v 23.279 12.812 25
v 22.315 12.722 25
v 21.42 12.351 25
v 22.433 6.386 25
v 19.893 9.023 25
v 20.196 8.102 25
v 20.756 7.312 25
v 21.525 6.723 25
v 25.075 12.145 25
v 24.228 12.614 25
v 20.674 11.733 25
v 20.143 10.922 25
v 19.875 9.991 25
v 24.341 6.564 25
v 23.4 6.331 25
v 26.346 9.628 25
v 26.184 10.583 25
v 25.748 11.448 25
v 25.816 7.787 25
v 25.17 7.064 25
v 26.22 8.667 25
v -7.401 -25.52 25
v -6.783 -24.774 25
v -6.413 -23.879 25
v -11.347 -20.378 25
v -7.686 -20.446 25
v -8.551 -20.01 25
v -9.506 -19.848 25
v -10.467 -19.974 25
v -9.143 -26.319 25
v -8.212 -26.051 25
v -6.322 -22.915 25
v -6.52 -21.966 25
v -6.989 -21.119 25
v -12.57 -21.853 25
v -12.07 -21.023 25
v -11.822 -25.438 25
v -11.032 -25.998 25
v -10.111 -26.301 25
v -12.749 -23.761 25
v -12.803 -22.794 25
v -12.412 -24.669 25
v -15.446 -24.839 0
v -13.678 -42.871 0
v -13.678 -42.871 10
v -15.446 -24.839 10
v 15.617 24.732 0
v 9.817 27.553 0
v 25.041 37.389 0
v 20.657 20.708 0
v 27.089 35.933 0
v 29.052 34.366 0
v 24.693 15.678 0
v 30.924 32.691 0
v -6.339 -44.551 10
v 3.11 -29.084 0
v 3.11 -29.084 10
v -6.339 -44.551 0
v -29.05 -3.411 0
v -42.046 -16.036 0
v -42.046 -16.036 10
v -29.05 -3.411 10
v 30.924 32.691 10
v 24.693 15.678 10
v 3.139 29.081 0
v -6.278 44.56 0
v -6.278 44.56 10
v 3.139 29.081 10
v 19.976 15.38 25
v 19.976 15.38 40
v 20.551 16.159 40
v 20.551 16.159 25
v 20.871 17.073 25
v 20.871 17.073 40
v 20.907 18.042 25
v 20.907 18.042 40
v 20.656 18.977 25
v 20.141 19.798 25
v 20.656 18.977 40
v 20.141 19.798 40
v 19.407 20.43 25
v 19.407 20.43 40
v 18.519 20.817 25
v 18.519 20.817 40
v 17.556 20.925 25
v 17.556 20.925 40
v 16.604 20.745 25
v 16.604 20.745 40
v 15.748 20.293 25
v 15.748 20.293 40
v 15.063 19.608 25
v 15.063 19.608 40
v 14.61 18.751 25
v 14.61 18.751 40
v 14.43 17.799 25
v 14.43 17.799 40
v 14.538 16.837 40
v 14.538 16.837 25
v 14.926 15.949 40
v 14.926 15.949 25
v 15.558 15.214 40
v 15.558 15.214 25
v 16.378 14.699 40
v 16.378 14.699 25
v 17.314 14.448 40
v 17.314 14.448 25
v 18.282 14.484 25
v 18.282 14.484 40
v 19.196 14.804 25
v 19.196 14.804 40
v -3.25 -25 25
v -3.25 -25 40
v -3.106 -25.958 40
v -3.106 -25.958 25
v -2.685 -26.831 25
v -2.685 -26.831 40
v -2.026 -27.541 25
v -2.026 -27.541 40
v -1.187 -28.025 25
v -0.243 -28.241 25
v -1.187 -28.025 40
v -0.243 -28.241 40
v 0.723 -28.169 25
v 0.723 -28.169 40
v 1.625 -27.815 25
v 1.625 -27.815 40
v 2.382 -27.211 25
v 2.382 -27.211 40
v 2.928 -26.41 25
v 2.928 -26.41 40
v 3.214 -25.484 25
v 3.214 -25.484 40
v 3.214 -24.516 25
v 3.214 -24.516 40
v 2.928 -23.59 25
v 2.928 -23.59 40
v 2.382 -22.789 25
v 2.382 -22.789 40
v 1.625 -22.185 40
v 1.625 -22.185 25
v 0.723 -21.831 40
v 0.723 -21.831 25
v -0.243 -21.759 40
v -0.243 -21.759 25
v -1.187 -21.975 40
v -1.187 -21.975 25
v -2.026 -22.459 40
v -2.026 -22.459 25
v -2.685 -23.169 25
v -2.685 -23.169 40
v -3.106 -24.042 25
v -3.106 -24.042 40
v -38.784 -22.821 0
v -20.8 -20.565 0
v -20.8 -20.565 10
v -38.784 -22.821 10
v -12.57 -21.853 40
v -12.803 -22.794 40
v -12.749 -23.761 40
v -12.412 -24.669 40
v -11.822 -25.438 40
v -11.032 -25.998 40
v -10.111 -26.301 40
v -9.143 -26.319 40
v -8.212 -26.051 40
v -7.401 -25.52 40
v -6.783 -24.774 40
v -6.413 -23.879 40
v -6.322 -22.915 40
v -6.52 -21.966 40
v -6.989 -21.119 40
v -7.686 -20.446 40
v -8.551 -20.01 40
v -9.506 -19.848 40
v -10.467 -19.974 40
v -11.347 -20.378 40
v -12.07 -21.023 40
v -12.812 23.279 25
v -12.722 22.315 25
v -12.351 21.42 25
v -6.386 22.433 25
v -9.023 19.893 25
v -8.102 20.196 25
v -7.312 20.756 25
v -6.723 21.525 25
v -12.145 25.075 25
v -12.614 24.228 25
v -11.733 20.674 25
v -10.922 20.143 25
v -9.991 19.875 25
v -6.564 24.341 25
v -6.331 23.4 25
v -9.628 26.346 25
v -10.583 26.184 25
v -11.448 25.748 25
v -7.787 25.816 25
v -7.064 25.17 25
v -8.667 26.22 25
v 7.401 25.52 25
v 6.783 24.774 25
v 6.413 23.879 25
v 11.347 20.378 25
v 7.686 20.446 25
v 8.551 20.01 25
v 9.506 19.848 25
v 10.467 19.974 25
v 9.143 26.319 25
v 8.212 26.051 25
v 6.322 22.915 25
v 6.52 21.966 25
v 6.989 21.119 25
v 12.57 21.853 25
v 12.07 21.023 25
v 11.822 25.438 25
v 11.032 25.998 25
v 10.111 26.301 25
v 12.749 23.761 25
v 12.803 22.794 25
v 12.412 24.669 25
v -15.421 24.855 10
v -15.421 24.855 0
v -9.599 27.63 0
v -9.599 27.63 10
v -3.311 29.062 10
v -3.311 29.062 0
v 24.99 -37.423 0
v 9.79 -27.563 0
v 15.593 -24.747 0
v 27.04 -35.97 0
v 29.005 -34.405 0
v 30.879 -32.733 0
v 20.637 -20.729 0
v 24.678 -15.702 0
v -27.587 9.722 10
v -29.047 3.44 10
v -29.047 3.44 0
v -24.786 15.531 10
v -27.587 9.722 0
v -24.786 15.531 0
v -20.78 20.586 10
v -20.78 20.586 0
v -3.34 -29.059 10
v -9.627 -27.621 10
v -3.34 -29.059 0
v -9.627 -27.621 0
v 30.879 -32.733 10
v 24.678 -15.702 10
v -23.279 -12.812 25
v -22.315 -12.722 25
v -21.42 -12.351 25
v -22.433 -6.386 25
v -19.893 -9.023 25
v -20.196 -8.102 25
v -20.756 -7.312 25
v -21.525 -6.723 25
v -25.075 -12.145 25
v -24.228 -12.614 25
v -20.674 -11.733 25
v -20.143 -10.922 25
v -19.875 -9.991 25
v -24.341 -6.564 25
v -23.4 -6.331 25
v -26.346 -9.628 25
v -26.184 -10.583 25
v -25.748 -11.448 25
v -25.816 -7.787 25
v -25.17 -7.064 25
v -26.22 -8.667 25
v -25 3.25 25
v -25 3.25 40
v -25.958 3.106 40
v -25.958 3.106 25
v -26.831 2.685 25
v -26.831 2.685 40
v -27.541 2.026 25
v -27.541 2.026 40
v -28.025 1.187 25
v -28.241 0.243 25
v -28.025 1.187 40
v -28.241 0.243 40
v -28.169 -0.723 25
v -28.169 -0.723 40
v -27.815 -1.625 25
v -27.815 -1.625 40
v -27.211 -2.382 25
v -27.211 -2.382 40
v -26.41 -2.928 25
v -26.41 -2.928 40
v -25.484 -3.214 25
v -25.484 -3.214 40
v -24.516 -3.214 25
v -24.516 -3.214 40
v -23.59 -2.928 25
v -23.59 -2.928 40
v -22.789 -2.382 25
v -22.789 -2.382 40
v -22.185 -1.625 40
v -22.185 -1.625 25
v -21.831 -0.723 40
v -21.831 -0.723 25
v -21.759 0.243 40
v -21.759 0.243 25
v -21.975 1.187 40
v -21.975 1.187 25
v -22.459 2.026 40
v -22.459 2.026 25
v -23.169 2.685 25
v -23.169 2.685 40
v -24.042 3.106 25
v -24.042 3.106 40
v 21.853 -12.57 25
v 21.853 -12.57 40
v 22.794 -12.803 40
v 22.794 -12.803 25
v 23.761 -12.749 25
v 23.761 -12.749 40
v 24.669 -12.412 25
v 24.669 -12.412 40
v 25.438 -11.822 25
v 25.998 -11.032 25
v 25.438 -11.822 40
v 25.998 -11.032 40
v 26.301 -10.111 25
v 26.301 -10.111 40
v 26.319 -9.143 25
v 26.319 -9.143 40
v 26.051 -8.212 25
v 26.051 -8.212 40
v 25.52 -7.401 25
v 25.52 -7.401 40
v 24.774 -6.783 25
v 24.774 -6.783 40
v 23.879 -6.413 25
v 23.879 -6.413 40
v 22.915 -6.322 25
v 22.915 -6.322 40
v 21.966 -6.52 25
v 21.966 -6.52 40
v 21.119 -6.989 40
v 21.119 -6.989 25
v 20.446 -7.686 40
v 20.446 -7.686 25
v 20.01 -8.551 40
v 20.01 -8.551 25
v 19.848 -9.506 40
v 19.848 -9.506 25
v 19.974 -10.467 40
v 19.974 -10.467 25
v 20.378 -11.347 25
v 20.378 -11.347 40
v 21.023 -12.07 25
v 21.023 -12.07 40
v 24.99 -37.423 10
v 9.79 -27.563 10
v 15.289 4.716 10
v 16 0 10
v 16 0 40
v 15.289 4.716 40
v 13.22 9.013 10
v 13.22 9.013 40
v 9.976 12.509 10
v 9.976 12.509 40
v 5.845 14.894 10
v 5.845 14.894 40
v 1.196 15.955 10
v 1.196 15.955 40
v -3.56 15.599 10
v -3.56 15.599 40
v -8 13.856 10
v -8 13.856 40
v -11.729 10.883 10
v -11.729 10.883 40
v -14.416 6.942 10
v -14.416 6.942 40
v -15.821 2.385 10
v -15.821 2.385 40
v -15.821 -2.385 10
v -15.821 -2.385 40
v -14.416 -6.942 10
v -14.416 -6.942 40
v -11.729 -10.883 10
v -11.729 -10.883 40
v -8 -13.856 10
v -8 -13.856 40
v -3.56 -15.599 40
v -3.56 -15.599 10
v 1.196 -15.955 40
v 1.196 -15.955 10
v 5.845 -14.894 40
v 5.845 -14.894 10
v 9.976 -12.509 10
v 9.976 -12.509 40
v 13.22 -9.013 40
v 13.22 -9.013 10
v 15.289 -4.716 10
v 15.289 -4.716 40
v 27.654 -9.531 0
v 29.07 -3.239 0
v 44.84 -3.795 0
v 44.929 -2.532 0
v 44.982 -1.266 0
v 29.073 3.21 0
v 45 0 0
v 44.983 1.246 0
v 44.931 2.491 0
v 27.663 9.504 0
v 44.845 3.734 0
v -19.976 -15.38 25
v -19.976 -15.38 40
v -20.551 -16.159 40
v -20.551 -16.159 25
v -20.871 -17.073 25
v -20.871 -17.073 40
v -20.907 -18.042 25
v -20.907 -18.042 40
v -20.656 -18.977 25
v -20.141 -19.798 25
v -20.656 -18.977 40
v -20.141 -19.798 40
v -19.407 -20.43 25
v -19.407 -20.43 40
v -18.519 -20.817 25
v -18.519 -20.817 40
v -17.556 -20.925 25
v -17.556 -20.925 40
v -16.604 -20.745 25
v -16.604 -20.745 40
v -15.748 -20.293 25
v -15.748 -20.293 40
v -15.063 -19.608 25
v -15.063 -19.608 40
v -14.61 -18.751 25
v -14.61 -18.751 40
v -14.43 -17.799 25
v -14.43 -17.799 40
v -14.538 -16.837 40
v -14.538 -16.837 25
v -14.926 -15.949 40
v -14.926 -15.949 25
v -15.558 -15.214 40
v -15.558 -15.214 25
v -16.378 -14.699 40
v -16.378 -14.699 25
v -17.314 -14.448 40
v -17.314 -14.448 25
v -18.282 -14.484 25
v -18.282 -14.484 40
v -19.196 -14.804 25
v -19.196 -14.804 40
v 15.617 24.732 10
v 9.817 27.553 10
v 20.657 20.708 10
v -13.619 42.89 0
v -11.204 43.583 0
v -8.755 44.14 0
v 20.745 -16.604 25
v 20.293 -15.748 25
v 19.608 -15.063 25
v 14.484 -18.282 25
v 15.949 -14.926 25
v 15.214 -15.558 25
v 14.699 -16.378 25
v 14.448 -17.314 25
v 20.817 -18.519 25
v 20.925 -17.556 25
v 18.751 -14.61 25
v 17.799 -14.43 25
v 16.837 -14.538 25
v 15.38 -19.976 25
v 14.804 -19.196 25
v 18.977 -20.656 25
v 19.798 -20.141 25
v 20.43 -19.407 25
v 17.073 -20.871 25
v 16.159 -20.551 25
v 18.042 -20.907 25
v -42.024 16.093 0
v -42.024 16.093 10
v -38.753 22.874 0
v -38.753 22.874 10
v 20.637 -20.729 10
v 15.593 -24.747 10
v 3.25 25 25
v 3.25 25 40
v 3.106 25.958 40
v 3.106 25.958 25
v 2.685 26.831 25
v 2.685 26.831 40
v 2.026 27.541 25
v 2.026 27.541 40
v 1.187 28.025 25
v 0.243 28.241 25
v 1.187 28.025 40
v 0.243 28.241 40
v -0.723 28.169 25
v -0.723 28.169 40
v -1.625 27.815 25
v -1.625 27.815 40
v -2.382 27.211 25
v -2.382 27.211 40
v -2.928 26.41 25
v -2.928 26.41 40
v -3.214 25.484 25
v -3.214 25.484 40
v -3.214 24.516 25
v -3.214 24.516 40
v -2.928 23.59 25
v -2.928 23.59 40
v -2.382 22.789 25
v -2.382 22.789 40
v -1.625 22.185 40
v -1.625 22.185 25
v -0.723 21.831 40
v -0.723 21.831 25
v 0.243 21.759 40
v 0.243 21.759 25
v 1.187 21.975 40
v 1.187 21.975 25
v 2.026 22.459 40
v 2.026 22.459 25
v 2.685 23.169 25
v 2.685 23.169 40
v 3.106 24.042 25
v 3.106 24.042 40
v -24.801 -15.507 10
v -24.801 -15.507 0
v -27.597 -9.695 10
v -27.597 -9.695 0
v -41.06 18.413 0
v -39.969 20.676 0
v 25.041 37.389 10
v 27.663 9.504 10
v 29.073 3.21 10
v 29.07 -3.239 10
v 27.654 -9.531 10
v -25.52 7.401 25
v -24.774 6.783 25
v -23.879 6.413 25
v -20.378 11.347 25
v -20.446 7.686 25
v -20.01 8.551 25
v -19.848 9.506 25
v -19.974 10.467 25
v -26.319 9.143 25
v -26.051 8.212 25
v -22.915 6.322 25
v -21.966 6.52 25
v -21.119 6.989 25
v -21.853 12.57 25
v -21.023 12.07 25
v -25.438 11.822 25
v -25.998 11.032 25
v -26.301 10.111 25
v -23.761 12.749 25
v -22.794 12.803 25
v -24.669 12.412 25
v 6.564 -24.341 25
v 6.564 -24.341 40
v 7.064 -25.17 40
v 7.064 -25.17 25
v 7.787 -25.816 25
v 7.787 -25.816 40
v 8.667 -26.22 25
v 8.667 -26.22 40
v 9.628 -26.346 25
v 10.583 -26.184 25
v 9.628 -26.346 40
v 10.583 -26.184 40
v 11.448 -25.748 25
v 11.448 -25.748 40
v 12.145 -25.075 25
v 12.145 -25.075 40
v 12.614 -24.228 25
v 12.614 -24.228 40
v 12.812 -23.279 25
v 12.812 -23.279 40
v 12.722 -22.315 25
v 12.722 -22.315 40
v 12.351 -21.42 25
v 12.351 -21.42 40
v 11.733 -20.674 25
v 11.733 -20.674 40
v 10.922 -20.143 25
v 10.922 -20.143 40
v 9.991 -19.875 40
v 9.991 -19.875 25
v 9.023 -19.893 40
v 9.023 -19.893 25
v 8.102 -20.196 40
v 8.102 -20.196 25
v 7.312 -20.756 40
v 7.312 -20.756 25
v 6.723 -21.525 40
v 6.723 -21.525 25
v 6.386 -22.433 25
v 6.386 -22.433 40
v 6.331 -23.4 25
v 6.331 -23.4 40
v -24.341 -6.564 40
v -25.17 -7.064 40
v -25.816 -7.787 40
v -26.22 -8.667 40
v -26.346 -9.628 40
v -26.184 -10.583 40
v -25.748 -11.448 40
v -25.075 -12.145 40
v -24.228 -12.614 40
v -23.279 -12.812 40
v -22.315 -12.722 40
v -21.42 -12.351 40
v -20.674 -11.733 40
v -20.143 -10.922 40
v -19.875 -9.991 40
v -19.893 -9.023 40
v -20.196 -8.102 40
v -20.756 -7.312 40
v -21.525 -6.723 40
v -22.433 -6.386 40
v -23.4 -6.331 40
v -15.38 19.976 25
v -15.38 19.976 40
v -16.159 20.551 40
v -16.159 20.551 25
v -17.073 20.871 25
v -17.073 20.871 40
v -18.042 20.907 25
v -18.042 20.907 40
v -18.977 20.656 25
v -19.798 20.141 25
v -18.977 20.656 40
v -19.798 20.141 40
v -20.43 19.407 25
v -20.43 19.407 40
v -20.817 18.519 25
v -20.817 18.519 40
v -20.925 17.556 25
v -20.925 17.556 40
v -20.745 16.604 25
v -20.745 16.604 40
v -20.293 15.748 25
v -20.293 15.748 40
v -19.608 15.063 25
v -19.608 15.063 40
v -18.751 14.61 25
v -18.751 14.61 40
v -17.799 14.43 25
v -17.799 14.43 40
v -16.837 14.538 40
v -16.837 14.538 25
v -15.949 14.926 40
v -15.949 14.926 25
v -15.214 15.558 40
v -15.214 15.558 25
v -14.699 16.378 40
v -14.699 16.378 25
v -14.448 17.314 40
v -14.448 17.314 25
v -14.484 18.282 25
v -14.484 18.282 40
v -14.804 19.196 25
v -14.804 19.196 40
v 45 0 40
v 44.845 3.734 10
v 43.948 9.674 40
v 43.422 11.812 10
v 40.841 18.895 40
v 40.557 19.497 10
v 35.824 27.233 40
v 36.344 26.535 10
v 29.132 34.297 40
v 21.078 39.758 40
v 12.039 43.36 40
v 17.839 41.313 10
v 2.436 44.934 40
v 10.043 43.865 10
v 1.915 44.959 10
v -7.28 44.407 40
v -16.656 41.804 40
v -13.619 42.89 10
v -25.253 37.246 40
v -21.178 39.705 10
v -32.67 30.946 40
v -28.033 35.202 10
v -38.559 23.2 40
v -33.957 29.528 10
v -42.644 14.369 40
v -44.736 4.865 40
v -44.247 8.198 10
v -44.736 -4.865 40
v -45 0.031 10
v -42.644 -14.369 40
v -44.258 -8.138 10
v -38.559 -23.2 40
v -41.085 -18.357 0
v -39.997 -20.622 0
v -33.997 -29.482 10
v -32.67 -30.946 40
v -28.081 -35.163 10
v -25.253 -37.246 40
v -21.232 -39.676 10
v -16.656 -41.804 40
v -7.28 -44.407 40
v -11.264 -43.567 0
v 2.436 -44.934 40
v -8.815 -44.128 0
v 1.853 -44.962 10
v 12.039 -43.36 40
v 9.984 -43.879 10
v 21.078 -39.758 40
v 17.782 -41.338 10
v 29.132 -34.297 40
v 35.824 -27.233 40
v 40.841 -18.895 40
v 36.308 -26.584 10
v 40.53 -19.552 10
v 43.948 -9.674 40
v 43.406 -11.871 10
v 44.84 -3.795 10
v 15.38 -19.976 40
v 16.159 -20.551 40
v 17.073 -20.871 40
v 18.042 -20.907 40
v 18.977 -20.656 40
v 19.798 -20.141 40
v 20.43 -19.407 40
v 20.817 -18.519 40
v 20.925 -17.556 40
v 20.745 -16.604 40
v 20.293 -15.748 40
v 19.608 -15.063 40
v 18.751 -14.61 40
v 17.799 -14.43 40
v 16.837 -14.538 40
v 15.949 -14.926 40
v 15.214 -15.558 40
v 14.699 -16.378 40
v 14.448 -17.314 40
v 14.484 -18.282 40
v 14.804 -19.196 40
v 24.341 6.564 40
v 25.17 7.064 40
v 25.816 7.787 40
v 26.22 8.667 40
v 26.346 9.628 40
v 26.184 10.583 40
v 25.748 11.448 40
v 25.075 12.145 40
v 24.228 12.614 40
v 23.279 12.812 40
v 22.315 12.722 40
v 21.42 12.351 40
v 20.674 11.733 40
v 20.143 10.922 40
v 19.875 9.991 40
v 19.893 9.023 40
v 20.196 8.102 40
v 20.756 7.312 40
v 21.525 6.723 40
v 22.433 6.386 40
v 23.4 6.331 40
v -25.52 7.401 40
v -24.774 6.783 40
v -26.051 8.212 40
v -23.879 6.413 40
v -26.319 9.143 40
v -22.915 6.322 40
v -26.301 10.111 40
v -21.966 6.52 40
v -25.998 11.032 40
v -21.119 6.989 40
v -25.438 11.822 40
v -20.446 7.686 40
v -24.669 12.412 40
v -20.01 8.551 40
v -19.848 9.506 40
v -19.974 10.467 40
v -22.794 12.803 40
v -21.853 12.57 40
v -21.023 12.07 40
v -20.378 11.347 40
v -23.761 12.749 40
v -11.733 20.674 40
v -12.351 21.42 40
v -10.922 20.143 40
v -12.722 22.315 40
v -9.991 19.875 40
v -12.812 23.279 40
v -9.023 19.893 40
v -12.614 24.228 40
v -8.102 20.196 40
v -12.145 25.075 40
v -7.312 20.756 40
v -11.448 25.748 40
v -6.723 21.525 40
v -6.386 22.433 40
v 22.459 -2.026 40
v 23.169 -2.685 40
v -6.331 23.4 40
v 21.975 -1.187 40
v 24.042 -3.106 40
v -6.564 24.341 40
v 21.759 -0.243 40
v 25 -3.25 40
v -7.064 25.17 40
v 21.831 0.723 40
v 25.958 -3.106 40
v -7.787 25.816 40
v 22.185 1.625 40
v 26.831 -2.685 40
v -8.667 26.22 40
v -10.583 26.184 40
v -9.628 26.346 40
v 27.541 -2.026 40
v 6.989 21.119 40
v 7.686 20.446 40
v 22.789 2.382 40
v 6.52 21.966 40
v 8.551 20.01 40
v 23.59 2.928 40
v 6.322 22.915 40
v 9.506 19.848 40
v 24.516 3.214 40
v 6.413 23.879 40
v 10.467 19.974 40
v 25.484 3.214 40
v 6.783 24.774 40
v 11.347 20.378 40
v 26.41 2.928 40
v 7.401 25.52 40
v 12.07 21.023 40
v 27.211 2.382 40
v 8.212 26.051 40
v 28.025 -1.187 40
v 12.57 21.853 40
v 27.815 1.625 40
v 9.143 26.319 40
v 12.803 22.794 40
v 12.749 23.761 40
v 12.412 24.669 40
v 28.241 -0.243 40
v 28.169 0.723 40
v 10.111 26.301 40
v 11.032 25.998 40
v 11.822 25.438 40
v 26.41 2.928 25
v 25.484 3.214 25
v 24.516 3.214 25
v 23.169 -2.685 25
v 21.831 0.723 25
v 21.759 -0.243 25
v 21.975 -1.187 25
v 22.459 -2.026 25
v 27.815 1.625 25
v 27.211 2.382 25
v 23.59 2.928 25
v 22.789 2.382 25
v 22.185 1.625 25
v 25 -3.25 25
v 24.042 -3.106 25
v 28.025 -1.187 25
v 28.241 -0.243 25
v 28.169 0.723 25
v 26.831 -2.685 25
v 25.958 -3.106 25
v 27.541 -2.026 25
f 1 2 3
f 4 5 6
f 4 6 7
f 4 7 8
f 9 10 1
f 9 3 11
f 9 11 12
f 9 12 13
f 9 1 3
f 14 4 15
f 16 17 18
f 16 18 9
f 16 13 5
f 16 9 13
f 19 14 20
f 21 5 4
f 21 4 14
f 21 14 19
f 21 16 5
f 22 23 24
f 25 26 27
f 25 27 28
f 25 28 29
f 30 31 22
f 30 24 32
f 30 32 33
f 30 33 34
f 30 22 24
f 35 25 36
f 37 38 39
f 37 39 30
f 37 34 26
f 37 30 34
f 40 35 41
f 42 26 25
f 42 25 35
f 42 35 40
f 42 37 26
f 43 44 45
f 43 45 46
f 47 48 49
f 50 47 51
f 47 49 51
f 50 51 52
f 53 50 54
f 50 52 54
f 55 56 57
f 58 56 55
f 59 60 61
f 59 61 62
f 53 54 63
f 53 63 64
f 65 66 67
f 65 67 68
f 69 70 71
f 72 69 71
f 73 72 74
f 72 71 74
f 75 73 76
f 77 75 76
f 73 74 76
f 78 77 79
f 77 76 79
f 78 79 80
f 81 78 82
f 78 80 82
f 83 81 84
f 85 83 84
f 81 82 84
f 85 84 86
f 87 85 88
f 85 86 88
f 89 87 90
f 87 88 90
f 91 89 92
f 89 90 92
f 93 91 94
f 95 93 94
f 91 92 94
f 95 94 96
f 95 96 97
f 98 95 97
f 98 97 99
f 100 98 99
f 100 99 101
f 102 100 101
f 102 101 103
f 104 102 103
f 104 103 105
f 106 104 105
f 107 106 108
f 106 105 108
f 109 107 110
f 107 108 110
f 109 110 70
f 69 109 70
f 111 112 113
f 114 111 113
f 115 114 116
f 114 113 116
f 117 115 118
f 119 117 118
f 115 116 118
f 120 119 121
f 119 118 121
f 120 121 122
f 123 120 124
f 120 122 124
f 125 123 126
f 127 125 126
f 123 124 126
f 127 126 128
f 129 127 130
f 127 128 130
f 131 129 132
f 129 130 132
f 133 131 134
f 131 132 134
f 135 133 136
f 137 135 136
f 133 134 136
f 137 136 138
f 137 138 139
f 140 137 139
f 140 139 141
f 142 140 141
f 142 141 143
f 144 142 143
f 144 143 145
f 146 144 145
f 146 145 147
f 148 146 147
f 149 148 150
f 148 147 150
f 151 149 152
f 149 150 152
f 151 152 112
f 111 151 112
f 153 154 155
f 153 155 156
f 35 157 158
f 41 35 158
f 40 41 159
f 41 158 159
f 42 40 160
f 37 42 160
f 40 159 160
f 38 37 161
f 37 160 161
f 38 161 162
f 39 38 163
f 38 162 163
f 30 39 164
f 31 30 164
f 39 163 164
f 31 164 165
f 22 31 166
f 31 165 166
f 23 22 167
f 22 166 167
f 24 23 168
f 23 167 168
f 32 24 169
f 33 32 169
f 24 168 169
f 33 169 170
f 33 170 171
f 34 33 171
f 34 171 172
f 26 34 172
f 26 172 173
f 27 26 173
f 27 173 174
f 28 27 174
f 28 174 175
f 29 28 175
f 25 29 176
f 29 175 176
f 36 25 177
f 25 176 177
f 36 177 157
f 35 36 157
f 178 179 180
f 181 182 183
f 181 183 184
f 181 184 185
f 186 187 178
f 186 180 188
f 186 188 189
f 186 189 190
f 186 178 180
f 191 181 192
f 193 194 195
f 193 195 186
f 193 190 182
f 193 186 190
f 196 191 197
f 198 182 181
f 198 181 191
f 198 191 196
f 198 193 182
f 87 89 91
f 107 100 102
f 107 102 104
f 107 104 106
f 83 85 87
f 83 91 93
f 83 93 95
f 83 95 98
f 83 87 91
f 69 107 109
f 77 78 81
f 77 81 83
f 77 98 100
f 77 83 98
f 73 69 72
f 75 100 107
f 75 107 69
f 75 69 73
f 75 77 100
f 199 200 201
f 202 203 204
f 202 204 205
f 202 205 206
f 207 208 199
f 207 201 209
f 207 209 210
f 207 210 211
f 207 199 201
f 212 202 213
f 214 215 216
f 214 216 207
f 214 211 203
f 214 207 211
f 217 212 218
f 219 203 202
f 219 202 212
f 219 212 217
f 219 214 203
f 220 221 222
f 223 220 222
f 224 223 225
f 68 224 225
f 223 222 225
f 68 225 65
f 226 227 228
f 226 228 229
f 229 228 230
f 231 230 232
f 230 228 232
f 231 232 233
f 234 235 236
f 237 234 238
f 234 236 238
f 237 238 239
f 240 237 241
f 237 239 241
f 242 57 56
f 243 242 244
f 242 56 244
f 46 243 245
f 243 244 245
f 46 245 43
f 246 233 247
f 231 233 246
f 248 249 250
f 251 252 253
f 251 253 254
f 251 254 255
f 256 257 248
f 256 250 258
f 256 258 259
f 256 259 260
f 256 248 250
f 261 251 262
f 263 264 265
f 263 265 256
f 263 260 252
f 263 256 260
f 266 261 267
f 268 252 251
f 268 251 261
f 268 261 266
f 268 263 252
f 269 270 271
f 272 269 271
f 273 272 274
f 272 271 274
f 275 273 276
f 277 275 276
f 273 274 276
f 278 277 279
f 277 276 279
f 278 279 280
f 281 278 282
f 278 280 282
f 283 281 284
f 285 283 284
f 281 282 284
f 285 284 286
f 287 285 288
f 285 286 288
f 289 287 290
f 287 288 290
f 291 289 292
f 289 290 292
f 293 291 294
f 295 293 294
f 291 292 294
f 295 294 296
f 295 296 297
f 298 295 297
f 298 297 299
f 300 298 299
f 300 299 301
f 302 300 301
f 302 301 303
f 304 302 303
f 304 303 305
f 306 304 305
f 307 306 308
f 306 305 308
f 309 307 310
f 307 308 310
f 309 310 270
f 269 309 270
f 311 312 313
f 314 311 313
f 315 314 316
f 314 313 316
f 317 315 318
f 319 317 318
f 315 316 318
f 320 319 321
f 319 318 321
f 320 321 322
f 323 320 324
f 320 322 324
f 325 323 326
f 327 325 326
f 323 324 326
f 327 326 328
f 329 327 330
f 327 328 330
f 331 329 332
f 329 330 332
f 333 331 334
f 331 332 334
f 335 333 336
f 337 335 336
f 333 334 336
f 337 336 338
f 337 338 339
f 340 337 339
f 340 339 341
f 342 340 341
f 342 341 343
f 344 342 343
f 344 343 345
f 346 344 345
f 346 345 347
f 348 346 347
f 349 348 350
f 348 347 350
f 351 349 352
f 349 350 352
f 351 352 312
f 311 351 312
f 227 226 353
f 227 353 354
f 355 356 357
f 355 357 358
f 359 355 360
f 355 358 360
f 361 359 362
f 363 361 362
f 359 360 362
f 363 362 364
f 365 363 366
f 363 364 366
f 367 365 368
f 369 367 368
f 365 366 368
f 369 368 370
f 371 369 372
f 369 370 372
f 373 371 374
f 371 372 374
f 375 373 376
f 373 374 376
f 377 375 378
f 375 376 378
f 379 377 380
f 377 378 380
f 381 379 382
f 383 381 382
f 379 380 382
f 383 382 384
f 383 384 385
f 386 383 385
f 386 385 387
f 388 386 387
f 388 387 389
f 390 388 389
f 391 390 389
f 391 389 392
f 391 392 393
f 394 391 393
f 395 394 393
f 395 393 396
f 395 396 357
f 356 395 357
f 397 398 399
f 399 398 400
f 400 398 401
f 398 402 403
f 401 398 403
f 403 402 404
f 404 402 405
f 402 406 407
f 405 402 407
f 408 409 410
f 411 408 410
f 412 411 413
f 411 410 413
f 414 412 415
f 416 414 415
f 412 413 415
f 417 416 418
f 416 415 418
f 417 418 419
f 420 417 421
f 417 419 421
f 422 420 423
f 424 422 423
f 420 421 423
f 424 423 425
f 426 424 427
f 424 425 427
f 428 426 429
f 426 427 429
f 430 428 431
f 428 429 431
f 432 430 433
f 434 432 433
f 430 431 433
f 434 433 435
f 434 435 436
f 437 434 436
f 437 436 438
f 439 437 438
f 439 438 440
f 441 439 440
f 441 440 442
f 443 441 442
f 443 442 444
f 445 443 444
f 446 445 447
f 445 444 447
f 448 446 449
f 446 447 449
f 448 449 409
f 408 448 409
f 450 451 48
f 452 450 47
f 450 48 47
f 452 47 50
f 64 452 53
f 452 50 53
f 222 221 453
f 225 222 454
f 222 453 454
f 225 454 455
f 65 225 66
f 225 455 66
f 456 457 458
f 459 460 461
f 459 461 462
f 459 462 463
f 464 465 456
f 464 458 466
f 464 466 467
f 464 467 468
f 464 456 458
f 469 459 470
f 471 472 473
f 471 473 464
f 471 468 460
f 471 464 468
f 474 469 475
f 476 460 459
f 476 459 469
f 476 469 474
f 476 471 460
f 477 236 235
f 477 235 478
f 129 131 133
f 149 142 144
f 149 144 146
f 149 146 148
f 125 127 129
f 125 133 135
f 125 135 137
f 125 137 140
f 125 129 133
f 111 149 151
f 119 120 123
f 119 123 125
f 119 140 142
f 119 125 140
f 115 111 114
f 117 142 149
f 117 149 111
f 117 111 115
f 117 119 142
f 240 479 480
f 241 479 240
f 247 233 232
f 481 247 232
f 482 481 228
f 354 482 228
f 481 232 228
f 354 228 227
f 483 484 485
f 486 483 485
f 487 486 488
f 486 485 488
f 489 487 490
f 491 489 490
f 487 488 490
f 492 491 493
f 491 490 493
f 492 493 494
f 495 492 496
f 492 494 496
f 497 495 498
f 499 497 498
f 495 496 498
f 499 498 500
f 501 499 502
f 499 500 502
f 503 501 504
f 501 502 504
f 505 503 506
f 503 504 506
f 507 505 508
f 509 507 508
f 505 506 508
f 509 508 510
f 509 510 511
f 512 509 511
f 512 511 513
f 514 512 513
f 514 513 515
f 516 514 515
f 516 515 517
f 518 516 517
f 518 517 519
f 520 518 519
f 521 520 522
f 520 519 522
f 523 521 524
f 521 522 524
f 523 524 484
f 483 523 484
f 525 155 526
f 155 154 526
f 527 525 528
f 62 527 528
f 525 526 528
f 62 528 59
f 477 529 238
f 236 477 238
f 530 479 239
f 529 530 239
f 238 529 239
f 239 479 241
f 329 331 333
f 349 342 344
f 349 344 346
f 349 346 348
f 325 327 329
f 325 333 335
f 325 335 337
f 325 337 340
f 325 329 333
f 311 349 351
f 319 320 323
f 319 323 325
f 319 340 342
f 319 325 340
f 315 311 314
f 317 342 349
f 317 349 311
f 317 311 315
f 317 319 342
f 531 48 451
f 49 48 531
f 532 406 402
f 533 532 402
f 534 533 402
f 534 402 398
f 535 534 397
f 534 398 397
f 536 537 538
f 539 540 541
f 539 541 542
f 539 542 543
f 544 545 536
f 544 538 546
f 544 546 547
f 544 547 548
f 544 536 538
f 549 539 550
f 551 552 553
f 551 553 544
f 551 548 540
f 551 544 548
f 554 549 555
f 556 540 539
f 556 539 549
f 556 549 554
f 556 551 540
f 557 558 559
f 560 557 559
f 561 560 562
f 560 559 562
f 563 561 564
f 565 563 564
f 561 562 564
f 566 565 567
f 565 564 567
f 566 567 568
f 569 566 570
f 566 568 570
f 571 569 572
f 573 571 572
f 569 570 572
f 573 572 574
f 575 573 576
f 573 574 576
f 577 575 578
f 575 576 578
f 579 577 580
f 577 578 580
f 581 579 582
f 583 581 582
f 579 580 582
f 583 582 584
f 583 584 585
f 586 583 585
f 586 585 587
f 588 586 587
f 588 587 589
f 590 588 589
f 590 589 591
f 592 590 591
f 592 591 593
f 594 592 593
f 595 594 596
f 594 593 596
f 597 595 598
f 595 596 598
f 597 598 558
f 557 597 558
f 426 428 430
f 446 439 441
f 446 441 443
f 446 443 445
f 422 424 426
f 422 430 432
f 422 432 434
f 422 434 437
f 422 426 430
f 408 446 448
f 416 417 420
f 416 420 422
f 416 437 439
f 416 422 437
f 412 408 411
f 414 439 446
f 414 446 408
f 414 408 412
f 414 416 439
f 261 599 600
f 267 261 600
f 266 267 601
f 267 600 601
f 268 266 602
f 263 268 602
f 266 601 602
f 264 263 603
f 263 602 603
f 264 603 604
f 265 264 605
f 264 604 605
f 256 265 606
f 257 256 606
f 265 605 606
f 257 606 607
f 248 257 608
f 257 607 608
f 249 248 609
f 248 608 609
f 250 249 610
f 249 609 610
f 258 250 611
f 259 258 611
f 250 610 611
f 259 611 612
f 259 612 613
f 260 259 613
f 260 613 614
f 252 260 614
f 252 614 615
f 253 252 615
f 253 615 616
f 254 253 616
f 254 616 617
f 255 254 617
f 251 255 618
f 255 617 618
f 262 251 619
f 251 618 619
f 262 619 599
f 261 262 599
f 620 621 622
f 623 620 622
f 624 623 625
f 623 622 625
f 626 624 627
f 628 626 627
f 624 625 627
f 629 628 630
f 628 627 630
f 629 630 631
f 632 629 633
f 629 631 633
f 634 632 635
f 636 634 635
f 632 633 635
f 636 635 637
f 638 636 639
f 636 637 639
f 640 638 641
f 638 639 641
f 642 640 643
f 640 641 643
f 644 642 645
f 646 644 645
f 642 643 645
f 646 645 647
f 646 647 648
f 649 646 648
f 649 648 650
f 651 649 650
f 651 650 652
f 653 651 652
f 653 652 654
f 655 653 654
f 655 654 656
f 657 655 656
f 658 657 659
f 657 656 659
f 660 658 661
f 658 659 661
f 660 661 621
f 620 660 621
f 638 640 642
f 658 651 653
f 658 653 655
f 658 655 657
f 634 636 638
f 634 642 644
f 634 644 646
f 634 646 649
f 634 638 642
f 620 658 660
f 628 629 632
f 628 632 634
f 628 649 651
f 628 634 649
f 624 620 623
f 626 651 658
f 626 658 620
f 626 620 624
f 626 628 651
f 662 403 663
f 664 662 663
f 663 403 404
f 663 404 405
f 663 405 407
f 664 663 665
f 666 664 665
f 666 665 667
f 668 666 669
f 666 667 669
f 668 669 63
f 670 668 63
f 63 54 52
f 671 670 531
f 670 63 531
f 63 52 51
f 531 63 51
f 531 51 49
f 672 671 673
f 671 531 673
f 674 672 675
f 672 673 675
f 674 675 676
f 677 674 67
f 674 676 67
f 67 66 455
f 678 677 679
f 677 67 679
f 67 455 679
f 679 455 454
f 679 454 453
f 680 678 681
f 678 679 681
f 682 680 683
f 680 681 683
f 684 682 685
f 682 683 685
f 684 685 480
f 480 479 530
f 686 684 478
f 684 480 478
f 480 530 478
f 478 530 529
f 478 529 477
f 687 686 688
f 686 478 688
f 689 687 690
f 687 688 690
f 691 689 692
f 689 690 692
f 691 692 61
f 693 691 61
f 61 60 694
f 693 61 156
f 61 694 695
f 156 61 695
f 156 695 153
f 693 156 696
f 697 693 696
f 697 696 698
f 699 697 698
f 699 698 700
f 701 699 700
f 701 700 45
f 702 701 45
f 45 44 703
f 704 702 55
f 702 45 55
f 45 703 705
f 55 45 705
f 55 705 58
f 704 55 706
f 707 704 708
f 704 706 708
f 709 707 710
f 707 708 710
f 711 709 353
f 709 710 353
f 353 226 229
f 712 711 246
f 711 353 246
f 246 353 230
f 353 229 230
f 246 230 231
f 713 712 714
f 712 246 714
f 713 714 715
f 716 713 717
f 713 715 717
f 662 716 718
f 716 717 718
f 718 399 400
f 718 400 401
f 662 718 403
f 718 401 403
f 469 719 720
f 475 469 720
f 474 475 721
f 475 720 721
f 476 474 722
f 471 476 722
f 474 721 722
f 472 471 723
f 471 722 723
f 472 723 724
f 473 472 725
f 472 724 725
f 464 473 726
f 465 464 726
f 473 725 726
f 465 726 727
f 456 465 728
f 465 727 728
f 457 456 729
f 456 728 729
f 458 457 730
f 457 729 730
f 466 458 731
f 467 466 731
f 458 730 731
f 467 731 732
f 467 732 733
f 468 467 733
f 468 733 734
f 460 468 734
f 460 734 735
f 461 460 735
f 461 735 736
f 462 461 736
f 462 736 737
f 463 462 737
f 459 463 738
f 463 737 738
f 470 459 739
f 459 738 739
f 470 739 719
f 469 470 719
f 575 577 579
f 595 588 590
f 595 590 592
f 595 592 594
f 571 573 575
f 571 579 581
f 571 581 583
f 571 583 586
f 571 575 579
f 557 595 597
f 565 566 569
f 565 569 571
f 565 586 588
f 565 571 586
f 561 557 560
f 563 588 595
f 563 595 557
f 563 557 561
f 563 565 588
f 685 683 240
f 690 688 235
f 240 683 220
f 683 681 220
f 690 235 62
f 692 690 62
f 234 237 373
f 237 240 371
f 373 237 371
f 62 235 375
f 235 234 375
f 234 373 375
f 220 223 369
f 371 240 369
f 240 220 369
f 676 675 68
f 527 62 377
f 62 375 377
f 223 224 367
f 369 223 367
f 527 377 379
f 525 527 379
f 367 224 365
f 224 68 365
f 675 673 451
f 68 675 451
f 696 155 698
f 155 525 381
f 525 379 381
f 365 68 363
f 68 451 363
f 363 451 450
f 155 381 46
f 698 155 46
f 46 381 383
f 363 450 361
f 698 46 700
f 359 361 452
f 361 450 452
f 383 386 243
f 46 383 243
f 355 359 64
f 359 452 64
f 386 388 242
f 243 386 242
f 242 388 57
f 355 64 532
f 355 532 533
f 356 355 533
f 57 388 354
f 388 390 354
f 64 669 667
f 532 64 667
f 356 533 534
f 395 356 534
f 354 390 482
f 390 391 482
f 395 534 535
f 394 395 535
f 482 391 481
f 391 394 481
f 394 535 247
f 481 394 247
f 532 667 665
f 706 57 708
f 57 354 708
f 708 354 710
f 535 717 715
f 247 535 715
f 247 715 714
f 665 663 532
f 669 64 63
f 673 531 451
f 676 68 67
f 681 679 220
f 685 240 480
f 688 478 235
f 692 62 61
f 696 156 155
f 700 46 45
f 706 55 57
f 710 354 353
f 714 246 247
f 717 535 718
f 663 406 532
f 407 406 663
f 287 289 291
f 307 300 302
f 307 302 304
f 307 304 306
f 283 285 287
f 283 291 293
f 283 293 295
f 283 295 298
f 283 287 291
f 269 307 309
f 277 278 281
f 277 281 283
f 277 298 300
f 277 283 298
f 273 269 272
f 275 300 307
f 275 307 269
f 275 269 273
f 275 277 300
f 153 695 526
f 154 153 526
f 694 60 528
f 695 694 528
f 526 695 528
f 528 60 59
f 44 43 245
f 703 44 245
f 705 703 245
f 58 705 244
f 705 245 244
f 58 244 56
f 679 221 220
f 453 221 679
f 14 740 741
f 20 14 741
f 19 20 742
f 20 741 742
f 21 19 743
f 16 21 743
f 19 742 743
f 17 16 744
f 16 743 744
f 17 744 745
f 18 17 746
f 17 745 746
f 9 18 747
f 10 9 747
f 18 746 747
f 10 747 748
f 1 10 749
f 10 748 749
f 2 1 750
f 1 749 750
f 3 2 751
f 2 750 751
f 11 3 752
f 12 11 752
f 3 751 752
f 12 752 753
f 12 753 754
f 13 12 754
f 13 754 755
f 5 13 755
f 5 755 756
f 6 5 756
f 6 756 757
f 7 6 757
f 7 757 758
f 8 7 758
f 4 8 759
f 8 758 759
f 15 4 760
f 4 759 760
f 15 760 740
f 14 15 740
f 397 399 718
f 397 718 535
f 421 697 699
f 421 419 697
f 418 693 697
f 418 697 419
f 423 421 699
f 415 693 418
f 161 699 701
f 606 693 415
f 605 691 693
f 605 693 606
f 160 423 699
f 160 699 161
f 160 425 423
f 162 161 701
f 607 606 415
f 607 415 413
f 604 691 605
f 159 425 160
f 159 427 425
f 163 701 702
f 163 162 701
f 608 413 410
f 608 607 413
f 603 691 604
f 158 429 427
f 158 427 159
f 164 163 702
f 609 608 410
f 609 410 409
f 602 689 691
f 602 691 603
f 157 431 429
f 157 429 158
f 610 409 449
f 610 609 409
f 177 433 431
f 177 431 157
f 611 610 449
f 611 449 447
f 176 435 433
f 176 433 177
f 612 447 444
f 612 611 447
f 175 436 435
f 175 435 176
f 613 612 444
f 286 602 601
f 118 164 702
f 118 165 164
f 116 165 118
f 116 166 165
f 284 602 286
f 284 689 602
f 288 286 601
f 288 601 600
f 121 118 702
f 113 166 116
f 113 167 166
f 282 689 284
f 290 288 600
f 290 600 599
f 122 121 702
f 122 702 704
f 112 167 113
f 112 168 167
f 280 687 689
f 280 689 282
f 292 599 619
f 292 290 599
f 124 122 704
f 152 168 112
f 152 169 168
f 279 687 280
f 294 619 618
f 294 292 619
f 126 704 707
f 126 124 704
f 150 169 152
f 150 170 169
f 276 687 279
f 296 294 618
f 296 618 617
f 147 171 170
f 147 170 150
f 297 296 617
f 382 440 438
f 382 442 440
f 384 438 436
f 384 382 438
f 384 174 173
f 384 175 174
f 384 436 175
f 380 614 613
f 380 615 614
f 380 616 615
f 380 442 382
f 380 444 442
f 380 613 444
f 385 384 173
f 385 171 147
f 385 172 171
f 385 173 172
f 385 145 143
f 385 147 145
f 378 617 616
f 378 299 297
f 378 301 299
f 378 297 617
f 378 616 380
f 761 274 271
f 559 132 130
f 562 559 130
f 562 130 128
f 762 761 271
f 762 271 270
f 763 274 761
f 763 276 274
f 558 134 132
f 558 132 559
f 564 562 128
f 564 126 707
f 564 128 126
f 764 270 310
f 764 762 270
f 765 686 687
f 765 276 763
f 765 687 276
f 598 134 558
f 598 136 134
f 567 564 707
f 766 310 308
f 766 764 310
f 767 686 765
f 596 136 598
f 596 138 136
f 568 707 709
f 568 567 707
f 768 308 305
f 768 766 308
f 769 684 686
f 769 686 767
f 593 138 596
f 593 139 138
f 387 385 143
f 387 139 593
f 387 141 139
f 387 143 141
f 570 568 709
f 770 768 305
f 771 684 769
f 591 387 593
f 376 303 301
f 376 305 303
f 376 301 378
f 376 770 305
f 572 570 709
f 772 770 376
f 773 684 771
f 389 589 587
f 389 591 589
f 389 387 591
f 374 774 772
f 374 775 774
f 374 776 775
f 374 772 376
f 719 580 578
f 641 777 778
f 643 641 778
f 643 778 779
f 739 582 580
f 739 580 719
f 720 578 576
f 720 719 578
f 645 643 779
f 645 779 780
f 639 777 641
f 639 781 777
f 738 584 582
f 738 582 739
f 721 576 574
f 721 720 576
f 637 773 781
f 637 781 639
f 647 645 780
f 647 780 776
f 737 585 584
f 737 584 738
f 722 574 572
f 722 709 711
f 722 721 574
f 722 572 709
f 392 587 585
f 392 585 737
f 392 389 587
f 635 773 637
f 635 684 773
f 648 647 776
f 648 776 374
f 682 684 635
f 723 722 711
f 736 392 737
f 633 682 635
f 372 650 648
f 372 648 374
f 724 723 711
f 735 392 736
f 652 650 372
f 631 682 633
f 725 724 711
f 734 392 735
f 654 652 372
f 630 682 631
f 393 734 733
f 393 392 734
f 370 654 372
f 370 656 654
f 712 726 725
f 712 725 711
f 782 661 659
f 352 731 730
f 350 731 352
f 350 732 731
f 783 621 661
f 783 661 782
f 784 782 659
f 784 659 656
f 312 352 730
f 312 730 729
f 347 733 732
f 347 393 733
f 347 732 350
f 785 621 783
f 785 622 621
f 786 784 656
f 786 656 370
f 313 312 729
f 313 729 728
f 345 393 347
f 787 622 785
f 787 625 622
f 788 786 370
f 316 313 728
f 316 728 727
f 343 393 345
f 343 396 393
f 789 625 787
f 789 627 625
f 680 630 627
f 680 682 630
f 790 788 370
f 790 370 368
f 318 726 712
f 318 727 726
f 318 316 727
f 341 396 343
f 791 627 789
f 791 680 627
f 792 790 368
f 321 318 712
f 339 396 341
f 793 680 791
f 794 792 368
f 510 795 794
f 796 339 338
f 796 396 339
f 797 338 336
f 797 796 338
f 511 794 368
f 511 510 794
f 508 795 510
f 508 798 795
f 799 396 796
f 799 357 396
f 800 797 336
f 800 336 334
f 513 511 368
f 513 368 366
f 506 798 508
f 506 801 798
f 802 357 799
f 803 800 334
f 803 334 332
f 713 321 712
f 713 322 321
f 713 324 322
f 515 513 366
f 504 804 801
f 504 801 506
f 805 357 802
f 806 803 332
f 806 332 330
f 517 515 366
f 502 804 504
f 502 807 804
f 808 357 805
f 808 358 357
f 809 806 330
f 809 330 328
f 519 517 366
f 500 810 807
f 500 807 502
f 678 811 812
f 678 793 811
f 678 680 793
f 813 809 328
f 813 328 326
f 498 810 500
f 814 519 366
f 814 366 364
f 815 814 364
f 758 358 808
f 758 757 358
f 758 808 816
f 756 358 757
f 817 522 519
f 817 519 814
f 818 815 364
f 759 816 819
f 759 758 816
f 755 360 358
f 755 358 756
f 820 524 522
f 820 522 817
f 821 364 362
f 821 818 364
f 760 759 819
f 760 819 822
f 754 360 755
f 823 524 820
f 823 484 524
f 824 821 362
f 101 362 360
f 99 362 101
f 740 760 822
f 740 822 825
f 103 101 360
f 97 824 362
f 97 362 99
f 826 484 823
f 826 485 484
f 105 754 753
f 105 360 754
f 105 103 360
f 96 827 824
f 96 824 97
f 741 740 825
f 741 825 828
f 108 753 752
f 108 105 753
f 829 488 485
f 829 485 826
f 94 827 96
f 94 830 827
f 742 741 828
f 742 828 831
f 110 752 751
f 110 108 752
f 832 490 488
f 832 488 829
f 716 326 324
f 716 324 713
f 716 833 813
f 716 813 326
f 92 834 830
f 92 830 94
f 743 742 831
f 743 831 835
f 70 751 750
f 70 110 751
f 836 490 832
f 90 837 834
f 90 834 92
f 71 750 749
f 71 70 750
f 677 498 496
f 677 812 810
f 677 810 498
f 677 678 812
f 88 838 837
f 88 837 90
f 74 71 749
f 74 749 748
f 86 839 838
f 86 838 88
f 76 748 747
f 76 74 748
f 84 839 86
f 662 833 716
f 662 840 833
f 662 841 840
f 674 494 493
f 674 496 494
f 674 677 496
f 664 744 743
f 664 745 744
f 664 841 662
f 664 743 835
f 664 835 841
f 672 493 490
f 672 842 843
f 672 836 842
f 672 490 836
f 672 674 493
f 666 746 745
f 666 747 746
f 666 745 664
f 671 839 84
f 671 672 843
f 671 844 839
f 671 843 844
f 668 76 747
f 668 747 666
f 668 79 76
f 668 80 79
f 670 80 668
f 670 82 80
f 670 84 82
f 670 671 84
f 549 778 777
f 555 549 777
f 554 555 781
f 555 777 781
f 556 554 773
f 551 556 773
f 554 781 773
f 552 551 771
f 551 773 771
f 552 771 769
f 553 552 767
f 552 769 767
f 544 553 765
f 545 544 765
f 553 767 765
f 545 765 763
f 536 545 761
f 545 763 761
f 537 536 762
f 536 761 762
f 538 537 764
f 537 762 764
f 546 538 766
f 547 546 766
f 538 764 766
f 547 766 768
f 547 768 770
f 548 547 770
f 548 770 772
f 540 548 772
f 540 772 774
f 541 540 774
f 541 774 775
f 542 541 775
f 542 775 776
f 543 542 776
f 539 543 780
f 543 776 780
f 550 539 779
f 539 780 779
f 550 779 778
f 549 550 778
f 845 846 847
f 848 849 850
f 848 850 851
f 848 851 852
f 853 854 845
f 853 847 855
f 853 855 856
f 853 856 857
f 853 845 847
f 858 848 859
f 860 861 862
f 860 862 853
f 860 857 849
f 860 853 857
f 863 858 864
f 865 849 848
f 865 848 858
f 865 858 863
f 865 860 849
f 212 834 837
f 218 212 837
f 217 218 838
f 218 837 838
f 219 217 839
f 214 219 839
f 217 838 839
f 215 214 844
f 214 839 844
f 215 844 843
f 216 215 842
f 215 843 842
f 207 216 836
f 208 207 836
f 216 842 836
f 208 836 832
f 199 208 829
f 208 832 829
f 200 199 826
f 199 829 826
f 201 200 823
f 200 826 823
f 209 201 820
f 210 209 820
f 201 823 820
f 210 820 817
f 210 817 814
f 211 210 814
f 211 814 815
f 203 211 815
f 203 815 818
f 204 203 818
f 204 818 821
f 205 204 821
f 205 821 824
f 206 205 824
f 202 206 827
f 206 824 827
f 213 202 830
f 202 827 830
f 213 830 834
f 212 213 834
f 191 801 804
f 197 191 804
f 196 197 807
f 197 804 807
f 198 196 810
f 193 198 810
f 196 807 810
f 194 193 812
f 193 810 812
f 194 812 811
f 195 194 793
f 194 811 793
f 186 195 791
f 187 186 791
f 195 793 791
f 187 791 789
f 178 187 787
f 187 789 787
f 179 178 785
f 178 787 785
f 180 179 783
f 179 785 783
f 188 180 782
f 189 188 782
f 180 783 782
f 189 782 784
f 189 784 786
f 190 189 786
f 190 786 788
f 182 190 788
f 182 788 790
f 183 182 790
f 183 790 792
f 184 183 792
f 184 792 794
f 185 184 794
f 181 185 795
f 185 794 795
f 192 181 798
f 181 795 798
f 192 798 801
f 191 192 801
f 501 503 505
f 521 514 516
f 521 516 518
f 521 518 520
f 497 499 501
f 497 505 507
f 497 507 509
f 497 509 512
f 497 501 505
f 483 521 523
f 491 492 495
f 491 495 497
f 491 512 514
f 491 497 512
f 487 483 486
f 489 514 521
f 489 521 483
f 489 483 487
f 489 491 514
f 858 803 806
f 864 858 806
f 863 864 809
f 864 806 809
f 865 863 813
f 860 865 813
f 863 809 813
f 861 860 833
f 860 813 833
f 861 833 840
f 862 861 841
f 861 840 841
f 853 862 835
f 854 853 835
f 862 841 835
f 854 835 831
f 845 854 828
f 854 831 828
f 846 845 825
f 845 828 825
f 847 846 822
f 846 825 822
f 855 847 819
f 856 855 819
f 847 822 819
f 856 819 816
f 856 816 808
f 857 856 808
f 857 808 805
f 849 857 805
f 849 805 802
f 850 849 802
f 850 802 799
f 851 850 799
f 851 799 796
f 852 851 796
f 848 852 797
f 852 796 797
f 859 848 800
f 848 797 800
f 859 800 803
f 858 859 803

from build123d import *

# Parameters (mm, degrees)
SKETCH_R              = 45
PAD_DEPTH             = 40
SKETCH001_R           = 12
POCKET_DEPTH          = 40.001
SKETCH002_R           = 29.25
POCKET001_DEPTH       = 10
SKETCH003_R           = 3.25
POCKET002_DEPTH       = 15
POLARPATTERN_COUNT    = 16
SKETCH004_R           = 16
POCKET003_DEPTH       = 40.001
POCKET004_DEPTH       = 10
POLARPATTERN001_COUNT = 7


with BuildPart() as part:
    # Sketch → Pad (new body)
    with BuildSketch(Plane.XY):
        Circle(SKETCH_R)
    extrude(amount=PAD_DEPTH)

    # Sketch001 → Pocket (cut, through all)
    with BuildSketch(Plane(origin=(0, 0, 0), x_dir=(1, 0, 0), z_dir=(0, 0, -1))):
        Circle(SKETCH001_R)
    extrude(amount=-POCKET_DEPTH, mode=Mode.SUBTRACT)

    # Sketch002 → Pocket001 (cut)
    with BuildSketch(Plane(origin=(0, 0, 0), x_dir=(1, 0, 0), z_dir=(0, 0, -1))):
        Circle(SKETCH002_R)
    extrude(amount=-POCKET001_DEPTH, mode=Mode.SUBTRACT)

    # Sketch003 → Pocket002 (cut)
    with BuildSketch(Plane.XY.offset(40)):
        with Locations((0, 25)):
            Circle(SKETCH003_R)
    pocket002 = extrude(amount=-POCKET002_DEPTH, mode=Mode.SUBTRACT)

    # PolarPattern: Pocket002 ×16 about axis
    polarpattern_axis = Axis((0, 0, 40), (0, 0, 1))
    for i in range(1, POLARPATTERN_COUNT):
        add(pocket002.rotate(polarpattern_axis, i * 360 / POLARPATTERN_COUNT), mode=Mode.SUBTRACT)

    # Sketch004 → Pocket003 (cut, through all)
    with BuildSketch(Plane.XY.offset(40)):
        Circle(SKETCH004_R)
    extrude(amount=-POCKET003_DEPTH, mode=Mode.SUBTRACT)

    # Sketch005 → Pocket004 (cut)
    with BuildSketch(Plane(origin=(0, 0, 0), x_dir=(1, 0, 0), z_dir=(0, 0, -1))):
        Polygon((-12.266942, 54.255708), (34.539446, 43.617943), (8.189071, 26.52432), (11.054546, 21.833583), (-0.504584, 24.460645), (4.106836, 27.452097), align=None)
    pocket004 = extrude(amount=-POCKET004_DEPTH, mode=Mode.SUBTRACT)

    # PolarPattern001: Pocket004 ×7 about axis
    polarpattern001_axis = Axis((0, 0, 0), (0, 0, -1))
    for i in range(1, POLARPATTERN001_COUNT):
        add(pocket004.rotate(polarpattern001_axis, i * 360 / POLARPATTERN001_COUNT), mode=Mode.SUBTRACT)


solid = part.part
